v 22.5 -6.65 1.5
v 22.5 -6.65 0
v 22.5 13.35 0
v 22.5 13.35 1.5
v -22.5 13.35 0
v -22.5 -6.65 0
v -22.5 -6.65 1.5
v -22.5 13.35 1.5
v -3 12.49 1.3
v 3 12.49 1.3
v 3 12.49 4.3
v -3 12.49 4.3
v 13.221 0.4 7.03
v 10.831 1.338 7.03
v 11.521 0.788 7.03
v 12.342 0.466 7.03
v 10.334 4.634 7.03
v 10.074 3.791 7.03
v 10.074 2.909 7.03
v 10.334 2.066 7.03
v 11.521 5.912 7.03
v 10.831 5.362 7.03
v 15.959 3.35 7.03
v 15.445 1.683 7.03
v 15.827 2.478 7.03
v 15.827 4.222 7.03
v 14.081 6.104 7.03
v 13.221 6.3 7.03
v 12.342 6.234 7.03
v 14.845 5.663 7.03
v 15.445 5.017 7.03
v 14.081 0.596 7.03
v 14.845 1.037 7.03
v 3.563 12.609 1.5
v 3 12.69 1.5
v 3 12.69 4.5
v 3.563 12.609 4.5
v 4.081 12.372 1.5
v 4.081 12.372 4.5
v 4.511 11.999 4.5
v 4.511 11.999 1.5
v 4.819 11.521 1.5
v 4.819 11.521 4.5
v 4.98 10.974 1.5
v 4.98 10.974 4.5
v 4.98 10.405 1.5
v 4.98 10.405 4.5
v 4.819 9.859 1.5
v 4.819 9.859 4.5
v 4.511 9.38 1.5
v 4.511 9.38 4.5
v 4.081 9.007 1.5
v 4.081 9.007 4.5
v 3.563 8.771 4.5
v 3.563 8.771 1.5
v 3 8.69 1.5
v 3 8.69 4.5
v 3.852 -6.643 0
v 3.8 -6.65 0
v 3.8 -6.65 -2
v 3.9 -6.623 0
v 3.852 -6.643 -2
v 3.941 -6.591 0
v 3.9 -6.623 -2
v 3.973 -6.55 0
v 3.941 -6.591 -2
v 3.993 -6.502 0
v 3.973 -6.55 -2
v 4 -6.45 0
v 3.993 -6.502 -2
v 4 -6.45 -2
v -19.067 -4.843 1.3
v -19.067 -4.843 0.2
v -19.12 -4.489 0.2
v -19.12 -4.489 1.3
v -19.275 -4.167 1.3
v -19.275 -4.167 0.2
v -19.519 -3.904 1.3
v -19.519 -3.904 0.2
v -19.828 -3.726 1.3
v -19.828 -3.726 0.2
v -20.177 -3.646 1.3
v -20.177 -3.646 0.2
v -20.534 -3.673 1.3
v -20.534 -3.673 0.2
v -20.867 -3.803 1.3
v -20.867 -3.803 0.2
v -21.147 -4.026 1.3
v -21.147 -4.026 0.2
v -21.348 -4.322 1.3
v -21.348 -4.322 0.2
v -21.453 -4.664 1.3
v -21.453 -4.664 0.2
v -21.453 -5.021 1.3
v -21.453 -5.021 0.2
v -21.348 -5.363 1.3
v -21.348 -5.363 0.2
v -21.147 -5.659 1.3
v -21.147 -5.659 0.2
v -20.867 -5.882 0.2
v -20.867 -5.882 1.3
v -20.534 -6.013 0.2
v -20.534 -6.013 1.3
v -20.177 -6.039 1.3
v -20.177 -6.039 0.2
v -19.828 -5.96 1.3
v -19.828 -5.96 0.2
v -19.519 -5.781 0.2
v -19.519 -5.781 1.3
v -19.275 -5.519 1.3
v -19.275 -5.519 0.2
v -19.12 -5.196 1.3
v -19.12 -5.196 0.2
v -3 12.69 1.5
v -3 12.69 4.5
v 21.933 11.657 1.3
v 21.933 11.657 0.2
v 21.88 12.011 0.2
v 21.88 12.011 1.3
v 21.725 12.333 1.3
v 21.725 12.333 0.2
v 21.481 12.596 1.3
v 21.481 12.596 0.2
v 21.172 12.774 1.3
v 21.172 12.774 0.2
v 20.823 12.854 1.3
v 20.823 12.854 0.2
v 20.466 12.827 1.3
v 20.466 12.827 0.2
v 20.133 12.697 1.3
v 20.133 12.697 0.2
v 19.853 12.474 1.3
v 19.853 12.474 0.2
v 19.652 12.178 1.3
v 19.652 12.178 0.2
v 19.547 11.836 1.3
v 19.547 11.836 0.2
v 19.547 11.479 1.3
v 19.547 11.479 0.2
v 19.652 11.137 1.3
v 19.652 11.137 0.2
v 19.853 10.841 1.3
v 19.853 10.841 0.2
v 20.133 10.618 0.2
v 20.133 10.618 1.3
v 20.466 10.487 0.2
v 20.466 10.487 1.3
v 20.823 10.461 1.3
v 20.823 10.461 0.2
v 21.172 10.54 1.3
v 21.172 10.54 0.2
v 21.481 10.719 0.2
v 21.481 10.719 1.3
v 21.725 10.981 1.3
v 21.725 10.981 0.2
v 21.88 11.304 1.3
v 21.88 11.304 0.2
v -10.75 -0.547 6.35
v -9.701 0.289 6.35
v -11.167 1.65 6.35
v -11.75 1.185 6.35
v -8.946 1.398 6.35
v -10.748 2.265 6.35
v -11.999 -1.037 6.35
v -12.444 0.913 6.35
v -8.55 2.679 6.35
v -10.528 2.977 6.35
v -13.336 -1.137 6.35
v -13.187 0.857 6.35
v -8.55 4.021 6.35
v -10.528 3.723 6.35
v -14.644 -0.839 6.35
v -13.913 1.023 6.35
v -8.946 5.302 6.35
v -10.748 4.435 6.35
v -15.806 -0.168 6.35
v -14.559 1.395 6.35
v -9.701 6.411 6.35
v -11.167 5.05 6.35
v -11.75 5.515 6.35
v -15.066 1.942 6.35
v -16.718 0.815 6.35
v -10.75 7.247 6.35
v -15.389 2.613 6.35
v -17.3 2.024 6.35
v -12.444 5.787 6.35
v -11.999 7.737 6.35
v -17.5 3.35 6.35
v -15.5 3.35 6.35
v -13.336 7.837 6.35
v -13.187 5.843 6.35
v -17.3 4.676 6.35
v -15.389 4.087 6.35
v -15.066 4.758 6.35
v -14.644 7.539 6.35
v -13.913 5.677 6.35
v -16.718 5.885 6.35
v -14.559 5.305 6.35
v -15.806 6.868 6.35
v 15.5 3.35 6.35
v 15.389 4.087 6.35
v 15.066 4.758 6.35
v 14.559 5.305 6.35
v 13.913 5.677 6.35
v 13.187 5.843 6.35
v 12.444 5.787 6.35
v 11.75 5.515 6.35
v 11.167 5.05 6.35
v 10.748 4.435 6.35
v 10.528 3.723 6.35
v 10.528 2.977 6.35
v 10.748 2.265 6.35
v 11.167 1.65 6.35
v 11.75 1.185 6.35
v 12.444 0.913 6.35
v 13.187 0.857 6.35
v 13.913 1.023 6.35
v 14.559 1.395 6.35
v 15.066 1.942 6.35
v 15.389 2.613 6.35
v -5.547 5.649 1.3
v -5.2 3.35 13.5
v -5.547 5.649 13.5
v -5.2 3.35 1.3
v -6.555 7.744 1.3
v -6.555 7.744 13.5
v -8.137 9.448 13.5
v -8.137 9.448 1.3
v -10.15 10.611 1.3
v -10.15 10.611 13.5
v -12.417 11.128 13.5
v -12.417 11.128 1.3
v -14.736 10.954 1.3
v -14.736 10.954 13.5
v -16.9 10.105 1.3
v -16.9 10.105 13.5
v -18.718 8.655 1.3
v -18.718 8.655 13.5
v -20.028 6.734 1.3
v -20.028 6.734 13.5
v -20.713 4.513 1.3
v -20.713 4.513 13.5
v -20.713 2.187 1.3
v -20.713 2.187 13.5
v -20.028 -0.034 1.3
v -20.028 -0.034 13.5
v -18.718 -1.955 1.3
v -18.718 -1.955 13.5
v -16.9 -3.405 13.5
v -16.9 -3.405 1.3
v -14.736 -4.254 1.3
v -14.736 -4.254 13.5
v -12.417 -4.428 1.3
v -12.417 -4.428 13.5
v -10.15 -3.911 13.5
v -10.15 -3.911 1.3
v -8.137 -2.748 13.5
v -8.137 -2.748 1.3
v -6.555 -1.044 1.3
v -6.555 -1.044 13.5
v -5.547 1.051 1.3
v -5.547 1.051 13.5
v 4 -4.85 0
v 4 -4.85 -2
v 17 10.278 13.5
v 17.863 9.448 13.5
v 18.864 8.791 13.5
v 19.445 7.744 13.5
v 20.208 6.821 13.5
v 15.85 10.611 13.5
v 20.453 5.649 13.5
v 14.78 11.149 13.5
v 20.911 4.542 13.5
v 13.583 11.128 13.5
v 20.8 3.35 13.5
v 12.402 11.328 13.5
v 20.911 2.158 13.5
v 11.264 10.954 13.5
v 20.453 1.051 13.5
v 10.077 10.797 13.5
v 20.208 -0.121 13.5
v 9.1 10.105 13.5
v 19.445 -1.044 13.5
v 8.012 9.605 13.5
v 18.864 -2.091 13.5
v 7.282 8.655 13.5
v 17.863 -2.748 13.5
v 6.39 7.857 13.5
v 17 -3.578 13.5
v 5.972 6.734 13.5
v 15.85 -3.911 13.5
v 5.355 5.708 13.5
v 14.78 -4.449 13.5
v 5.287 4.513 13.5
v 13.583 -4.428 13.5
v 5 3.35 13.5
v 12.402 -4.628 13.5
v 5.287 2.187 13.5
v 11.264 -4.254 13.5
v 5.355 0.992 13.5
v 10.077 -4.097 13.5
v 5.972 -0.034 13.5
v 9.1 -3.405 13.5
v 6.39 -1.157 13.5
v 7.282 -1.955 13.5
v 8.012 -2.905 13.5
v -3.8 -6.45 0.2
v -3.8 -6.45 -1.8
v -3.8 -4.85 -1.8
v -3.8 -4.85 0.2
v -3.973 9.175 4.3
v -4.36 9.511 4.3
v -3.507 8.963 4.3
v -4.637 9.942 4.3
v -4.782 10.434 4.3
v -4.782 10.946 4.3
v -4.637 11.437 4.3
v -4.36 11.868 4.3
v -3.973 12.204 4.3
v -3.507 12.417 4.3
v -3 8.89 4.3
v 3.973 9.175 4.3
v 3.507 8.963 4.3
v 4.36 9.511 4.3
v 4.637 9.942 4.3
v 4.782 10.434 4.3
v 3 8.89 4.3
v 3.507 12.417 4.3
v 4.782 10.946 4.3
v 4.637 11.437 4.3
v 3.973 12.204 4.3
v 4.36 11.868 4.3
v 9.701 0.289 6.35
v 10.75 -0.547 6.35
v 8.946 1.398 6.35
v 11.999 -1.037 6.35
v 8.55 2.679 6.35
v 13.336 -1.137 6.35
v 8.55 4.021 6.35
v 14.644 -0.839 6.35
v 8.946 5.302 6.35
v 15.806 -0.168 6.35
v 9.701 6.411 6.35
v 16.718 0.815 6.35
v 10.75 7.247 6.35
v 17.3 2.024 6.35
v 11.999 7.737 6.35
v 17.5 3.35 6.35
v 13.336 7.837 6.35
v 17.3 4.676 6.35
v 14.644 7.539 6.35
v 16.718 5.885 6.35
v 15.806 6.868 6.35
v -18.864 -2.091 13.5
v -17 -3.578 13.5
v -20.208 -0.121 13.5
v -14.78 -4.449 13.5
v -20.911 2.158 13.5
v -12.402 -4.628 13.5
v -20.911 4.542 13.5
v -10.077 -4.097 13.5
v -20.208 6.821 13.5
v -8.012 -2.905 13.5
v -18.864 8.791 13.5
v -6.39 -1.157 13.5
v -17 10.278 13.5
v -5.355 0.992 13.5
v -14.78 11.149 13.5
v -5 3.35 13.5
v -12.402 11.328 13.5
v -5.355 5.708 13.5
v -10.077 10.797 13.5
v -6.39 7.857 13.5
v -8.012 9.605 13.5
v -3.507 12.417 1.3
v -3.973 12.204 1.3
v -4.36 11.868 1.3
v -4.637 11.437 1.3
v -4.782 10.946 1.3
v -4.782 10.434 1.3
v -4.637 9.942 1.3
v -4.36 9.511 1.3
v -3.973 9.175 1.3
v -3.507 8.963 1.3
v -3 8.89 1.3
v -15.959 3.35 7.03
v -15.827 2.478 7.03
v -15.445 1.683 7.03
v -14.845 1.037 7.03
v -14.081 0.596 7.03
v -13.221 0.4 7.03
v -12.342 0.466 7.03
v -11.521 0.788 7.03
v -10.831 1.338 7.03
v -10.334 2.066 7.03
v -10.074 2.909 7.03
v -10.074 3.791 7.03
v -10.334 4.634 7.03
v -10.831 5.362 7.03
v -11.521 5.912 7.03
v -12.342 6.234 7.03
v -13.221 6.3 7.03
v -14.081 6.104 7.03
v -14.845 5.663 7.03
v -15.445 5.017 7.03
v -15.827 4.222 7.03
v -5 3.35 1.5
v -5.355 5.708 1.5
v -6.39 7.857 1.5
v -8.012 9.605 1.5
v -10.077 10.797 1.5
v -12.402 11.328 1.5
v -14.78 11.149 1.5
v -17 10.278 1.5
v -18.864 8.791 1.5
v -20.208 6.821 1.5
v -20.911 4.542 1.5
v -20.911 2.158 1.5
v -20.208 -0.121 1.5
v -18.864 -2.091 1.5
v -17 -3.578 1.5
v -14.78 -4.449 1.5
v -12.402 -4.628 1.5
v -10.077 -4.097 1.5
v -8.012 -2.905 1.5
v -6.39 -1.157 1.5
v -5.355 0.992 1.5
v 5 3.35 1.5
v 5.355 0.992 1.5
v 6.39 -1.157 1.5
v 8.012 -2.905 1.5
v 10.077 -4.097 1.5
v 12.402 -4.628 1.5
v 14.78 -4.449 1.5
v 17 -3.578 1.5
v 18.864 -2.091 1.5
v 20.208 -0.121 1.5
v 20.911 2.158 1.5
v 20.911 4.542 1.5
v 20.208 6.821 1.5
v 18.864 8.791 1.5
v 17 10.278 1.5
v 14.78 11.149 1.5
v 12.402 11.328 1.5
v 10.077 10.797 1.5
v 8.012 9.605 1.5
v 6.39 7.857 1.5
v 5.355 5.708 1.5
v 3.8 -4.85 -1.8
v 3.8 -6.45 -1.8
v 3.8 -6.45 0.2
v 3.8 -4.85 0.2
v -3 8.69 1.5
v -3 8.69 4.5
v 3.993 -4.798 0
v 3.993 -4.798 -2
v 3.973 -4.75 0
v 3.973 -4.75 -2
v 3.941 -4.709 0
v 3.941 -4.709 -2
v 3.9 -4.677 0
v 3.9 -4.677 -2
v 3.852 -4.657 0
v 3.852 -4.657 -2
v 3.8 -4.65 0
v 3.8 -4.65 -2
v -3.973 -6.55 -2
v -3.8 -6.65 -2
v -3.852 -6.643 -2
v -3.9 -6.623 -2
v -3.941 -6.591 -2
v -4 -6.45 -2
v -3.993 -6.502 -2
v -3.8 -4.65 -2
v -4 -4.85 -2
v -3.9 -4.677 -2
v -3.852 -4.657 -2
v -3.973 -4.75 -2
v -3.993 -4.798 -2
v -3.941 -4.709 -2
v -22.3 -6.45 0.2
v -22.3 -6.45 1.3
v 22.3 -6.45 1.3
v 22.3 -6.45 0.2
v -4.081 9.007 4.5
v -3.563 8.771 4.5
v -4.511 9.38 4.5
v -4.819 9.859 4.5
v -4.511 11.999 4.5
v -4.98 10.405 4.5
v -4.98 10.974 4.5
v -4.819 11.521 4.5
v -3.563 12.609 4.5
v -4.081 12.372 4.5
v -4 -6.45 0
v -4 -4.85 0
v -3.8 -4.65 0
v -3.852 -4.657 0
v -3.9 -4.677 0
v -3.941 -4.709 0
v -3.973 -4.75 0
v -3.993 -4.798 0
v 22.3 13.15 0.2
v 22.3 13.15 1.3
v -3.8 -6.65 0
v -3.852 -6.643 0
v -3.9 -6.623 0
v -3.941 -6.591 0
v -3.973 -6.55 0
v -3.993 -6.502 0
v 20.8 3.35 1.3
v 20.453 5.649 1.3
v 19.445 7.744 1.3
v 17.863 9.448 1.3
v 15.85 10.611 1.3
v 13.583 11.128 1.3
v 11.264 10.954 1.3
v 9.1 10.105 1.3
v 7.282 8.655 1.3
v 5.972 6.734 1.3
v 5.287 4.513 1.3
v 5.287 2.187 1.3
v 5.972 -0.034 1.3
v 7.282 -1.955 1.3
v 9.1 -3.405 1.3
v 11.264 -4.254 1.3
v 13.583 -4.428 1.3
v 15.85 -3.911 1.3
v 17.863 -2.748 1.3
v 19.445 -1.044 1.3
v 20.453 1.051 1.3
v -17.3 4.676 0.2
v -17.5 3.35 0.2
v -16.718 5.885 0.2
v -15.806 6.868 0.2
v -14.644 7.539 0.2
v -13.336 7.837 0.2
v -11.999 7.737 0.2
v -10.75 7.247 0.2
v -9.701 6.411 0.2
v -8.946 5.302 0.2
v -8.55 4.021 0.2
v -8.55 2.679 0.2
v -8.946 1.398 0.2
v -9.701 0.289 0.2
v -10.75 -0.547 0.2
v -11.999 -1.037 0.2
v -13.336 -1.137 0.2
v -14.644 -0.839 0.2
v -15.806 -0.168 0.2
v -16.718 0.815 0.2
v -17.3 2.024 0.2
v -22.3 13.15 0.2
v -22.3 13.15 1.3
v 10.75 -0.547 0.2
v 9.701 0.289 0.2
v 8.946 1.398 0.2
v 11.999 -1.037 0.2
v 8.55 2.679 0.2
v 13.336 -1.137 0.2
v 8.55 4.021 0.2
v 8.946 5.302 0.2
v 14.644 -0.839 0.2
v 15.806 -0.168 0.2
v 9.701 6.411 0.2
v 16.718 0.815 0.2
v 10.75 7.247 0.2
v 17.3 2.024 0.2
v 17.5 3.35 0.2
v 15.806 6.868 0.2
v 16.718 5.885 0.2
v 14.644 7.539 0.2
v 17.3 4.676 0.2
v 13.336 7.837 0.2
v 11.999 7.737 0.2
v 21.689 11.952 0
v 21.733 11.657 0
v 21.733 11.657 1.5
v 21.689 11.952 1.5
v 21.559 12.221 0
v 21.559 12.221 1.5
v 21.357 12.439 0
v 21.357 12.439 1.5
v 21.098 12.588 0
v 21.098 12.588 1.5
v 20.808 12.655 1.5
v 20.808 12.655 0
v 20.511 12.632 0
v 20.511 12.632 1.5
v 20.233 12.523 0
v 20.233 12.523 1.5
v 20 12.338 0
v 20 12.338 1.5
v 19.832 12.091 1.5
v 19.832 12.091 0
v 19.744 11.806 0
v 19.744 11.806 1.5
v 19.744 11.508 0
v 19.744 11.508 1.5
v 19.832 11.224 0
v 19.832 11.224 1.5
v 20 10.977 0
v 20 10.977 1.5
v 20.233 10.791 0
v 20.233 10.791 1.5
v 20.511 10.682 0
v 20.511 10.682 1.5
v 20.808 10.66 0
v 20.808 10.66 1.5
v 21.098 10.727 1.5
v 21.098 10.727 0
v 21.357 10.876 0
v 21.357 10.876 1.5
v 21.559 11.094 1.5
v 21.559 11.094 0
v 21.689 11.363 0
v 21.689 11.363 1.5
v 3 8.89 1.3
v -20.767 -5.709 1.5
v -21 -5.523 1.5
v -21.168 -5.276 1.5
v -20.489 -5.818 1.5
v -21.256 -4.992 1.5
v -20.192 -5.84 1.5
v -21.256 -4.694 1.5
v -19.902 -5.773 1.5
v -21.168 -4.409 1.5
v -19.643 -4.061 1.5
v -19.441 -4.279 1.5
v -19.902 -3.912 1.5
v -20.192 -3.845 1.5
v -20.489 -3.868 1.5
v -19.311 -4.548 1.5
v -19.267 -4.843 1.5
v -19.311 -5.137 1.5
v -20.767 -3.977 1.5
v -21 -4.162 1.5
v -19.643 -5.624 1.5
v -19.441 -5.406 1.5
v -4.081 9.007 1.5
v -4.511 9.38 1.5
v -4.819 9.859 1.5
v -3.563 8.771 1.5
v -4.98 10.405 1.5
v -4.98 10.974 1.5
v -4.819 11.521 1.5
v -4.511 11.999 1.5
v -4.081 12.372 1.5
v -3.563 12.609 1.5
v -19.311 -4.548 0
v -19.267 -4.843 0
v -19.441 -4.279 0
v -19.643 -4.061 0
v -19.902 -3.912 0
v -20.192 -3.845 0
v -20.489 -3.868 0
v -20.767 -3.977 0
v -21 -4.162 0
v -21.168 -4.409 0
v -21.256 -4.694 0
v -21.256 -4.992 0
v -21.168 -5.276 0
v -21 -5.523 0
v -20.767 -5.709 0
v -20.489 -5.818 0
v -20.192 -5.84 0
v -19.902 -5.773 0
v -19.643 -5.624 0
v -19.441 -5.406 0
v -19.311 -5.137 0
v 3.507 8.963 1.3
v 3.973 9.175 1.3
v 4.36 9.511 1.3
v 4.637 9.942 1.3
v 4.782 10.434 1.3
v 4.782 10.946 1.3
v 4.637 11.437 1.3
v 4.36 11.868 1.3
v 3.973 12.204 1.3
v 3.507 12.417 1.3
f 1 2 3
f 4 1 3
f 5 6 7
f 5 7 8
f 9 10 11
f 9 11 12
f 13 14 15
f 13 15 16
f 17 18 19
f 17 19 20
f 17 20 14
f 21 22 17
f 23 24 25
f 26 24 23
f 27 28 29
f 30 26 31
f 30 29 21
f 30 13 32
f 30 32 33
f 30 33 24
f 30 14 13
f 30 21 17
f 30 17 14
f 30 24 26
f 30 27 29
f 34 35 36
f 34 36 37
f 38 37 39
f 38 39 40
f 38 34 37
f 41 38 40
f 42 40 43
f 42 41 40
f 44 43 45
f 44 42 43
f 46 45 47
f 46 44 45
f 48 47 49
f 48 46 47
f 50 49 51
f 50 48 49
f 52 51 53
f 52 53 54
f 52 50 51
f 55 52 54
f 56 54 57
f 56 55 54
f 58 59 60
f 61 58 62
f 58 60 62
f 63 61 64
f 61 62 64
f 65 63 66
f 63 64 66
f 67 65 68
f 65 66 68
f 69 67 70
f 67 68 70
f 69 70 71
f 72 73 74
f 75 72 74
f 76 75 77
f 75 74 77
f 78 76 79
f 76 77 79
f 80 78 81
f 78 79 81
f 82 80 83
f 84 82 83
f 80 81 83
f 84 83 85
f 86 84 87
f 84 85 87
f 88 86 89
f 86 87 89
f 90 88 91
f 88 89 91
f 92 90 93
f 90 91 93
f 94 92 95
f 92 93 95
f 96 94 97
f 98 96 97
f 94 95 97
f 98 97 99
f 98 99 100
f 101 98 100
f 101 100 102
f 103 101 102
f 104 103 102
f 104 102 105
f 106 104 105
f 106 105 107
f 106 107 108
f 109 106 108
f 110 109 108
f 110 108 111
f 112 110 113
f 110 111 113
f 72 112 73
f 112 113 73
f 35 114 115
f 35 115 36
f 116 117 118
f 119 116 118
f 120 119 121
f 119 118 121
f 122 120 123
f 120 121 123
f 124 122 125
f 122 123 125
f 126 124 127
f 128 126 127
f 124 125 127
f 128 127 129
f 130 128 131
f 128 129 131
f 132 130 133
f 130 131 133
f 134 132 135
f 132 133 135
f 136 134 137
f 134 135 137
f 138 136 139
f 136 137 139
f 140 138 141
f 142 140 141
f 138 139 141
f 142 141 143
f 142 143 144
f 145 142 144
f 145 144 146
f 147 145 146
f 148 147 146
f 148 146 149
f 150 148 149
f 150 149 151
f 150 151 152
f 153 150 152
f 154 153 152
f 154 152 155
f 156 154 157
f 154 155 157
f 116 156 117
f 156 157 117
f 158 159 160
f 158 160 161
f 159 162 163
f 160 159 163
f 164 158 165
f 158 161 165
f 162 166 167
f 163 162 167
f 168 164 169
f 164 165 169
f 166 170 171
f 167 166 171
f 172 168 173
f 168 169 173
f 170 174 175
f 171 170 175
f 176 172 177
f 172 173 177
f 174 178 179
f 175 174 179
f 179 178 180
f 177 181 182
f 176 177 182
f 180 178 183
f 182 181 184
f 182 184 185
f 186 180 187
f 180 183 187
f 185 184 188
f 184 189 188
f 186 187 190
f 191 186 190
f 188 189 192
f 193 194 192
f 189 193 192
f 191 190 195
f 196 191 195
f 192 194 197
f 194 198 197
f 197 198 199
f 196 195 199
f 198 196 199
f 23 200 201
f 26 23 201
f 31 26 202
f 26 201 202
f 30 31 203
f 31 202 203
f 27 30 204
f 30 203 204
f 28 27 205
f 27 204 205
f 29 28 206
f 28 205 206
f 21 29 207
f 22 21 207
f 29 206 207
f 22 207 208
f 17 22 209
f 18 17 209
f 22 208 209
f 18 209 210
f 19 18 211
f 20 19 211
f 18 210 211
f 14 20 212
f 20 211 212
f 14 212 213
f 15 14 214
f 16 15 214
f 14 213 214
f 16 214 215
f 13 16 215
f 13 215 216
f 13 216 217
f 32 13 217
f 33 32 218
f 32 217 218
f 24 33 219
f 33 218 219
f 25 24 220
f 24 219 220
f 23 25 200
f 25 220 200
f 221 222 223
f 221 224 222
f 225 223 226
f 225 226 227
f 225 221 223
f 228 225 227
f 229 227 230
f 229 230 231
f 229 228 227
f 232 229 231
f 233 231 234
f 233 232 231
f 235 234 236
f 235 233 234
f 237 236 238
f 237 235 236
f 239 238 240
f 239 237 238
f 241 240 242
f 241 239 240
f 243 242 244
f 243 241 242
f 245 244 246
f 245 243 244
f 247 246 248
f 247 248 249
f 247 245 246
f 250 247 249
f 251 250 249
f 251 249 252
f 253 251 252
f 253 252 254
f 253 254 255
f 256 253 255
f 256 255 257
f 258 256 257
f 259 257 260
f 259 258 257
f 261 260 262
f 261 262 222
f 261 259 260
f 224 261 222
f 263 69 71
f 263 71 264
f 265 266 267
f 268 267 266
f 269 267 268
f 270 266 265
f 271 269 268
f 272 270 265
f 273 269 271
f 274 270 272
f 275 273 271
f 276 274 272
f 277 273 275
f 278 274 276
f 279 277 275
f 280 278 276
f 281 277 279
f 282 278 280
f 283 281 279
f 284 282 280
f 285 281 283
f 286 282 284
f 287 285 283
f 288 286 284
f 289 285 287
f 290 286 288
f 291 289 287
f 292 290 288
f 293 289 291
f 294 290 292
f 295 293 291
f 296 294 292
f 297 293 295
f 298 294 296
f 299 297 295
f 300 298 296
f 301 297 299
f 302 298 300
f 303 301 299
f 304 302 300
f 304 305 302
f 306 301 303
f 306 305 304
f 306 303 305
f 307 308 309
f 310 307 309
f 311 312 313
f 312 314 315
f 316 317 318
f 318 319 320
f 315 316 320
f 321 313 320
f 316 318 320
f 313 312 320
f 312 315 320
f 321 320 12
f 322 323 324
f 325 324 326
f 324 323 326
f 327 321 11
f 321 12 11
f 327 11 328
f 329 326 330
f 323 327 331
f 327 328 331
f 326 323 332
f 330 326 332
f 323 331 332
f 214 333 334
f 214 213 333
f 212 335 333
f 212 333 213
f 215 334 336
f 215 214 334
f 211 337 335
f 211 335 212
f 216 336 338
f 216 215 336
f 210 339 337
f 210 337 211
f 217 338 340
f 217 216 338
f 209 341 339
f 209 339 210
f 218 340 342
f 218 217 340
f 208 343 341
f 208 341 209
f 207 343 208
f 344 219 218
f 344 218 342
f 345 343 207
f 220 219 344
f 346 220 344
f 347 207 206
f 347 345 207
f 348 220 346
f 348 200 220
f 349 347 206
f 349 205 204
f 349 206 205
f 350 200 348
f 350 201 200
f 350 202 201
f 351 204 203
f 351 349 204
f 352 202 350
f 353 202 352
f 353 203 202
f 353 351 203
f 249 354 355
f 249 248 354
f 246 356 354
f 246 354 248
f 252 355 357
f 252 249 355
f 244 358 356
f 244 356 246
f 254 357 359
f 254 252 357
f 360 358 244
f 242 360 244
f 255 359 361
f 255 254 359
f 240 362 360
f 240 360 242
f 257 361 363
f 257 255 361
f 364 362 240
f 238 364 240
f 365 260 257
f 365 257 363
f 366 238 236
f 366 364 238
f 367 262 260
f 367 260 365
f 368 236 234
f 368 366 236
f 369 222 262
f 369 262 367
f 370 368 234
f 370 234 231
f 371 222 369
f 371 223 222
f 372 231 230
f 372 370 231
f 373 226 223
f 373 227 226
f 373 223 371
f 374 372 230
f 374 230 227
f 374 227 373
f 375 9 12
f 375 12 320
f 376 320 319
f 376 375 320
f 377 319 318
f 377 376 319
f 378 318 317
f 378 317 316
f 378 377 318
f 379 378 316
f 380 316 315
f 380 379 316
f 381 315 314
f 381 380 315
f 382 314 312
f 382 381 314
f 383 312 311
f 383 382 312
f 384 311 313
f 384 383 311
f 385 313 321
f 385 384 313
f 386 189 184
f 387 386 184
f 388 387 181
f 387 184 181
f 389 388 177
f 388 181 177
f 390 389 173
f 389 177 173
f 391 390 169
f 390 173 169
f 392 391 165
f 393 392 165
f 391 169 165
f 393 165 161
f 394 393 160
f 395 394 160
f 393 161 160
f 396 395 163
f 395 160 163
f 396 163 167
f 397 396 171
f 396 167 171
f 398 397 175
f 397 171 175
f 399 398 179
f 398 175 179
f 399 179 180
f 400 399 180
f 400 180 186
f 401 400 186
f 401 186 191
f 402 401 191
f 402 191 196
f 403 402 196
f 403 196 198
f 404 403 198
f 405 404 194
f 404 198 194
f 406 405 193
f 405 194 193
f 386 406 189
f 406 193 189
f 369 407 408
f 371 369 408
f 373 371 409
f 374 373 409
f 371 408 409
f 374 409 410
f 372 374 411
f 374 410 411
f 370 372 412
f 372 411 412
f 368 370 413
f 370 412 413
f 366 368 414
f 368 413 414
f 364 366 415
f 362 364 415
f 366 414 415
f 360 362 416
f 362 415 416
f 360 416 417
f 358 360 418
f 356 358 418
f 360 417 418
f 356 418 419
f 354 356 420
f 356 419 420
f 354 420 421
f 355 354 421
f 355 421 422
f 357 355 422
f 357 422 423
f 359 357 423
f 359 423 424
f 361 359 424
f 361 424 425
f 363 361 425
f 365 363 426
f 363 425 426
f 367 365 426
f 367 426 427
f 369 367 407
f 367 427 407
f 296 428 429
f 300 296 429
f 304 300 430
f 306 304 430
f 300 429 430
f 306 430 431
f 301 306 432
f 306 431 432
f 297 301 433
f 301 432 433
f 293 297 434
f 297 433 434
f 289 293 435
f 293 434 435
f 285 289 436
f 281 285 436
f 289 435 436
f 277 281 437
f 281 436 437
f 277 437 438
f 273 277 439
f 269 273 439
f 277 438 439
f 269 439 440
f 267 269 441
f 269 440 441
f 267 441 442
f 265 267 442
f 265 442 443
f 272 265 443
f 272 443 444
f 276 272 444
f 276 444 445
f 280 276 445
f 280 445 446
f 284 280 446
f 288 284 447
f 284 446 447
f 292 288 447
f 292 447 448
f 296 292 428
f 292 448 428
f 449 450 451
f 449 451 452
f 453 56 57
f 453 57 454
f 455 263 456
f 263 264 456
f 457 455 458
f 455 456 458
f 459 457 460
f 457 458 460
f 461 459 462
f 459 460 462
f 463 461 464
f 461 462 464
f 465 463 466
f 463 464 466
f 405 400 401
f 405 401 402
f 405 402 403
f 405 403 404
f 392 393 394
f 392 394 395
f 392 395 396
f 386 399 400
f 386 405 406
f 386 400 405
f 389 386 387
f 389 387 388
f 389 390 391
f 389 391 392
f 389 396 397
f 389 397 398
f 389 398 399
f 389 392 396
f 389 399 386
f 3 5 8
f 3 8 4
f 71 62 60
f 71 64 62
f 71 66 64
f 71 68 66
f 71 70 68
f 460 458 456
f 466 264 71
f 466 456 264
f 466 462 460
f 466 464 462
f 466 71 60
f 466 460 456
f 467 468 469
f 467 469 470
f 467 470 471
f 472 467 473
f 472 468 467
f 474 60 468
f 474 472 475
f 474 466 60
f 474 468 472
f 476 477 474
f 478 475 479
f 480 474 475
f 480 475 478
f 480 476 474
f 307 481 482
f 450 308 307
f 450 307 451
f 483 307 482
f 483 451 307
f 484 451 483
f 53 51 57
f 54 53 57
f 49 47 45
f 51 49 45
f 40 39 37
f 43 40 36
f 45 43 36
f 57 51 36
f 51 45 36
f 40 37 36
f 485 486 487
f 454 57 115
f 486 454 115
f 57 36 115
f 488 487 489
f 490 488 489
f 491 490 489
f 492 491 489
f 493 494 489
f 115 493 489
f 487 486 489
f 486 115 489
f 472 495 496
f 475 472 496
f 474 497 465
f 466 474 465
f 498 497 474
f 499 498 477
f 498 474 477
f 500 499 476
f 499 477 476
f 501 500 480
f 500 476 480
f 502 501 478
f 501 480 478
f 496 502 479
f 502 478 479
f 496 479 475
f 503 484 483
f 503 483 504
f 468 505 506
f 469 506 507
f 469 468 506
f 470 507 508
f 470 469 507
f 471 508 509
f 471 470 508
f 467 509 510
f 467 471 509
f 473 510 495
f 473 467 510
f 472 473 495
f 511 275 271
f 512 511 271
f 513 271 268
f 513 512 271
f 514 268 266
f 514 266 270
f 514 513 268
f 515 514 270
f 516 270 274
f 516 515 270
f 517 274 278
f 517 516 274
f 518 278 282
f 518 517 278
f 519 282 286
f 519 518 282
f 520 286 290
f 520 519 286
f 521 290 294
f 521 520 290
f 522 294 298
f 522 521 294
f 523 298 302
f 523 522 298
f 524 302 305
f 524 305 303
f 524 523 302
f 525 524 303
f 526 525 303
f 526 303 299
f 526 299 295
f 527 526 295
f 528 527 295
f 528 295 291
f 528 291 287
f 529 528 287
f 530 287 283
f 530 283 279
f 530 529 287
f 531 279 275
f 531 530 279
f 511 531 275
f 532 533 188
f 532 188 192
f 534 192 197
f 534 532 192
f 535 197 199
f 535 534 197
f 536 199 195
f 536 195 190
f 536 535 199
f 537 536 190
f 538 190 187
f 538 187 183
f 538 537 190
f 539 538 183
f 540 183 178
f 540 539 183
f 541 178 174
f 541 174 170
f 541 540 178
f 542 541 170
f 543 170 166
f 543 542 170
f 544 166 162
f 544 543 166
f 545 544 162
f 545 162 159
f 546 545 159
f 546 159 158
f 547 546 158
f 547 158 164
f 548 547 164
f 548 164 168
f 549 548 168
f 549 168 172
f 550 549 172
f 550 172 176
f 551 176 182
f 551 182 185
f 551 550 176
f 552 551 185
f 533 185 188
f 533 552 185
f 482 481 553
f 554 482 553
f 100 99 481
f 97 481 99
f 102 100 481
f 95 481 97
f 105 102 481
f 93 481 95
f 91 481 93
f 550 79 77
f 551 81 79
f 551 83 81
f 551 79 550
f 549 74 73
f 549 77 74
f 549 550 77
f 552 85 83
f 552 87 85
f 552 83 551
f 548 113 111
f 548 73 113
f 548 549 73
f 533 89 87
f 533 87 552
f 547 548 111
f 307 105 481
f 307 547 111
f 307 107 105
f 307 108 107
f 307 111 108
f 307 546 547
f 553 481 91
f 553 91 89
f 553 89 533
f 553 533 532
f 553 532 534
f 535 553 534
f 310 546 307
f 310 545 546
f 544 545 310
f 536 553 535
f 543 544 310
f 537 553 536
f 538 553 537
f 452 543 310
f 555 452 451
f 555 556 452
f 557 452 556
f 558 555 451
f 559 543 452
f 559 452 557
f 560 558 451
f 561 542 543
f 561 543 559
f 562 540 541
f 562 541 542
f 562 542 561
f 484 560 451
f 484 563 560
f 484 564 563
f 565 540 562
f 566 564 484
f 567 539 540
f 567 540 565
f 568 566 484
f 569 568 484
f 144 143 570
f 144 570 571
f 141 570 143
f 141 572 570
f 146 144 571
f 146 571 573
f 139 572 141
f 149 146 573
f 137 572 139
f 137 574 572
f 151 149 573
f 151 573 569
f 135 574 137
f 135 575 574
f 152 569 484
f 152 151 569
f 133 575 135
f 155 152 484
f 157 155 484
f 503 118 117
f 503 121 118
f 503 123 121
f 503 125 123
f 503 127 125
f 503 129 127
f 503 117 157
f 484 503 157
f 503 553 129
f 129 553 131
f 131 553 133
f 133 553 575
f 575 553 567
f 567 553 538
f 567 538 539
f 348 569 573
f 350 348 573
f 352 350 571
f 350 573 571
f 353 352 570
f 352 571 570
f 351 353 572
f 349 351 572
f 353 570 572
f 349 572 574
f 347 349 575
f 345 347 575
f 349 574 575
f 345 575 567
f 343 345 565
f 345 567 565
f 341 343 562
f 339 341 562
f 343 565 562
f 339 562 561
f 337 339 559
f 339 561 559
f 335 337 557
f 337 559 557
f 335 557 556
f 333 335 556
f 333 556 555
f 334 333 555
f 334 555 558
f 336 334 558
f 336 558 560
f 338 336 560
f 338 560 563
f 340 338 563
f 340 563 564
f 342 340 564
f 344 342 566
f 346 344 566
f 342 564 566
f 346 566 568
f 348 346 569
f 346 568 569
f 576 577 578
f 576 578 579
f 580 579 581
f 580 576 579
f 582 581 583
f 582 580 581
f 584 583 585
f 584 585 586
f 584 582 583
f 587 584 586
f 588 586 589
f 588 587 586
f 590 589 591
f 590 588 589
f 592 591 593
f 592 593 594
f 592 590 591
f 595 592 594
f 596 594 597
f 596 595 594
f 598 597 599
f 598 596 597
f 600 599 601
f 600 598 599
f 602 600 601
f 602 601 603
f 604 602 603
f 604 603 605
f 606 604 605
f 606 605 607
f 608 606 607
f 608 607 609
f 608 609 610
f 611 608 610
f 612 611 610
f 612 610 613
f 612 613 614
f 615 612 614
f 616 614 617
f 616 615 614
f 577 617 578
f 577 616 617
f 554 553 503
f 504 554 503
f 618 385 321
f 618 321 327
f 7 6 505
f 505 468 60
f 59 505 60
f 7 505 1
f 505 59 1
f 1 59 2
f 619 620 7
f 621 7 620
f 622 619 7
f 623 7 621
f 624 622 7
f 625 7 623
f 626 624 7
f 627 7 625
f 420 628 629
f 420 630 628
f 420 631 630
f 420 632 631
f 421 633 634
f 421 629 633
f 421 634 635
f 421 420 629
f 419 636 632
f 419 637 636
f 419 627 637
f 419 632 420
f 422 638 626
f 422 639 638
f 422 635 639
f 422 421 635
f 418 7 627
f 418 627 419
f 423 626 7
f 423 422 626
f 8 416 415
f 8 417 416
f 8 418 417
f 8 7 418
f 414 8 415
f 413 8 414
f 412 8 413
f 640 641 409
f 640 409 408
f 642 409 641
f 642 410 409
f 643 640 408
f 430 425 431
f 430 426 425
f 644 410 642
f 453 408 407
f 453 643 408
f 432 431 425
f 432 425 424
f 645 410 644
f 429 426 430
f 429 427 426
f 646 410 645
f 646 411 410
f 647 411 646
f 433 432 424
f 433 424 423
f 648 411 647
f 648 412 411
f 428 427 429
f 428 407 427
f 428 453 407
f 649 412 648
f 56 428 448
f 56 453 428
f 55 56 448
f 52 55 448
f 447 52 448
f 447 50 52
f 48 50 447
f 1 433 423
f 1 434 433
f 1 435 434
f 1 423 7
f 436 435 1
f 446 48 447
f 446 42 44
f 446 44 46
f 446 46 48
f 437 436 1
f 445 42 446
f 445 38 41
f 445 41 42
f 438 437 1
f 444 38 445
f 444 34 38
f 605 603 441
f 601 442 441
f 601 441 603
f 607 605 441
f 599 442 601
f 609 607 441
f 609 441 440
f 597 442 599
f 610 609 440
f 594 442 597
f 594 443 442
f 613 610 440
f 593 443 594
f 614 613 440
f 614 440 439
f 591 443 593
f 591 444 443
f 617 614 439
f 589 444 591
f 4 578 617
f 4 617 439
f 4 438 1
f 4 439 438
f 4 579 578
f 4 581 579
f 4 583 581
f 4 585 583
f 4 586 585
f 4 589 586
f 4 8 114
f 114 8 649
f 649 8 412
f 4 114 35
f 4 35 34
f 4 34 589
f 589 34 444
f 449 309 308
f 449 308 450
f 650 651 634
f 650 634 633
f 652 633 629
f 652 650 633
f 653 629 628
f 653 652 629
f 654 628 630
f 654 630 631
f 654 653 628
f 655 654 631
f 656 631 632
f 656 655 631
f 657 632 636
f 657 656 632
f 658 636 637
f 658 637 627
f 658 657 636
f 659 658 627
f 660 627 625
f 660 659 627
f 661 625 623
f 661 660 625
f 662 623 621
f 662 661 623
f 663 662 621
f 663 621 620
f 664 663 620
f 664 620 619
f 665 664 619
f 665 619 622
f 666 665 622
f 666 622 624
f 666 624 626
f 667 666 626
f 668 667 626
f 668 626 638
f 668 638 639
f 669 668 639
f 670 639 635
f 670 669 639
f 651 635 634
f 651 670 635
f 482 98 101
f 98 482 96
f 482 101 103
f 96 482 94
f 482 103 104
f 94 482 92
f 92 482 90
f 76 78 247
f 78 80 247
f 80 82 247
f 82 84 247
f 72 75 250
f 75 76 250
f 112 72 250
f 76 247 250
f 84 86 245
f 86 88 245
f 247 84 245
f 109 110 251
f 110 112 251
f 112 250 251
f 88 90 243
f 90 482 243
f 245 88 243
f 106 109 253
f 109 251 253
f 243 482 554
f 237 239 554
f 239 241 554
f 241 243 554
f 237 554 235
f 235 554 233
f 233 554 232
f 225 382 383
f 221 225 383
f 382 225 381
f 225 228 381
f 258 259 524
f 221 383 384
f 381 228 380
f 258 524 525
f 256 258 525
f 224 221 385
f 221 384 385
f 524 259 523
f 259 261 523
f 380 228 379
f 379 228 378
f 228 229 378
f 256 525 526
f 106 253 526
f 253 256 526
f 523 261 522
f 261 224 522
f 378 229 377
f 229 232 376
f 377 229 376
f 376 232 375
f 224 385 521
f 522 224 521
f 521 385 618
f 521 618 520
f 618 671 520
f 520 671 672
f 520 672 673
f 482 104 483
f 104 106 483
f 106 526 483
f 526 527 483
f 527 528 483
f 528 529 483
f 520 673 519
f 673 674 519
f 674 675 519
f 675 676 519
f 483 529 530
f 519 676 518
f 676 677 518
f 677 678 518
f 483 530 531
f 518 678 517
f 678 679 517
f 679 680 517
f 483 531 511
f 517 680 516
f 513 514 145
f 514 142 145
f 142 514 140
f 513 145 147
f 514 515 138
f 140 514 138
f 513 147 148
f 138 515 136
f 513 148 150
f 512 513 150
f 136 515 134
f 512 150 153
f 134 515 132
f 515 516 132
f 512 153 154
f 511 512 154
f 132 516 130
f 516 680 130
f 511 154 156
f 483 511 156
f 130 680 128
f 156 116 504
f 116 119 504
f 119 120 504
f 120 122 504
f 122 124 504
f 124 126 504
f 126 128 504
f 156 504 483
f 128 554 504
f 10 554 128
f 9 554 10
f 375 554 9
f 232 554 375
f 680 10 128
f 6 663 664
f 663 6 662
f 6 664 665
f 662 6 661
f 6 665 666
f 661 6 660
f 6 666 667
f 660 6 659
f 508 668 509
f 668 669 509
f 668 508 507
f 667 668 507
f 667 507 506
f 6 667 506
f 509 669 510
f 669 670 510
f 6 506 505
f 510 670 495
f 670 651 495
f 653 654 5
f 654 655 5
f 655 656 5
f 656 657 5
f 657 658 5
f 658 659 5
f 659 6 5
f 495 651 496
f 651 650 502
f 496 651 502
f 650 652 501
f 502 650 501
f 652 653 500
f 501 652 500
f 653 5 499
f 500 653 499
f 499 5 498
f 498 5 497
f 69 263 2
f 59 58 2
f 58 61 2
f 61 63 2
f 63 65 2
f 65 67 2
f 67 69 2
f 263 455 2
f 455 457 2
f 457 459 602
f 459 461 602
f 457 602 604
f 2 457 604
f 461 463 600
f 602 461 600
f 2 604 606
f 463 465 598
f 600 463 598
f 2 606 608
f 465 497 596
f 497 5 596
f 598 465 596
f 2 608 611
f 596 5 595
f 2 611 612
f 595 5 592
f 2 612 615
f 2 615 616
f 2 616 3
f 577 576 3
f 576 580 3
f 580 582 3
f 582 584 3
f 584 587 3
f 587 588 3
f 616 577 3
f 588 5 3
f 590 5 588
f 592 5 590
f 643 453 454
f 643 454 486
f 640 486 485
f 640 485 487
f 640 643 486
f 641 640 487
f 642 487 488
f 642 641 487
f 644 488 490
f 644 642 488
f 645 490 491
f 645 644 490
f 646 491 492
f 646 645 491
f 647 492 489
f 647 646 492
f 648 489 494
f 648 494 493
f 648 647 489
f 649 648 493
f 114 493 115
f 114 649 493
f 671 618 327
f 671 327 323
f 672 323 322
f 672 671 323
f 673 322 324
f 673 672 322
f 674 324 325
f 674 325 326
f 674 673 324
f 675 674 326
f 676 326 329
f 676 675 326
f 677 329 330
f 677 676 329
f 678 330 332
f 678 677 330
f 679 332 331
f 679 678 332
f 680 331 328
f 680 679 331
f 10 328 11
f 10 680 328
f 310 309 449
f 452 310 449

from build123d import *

# Parameters (mm, degrees)
CROQUIS1_W                = 45
CROQUIS1_H                = 20
CROQUIS1_R                = 1
SALIENTE_EXTRUIR1_DEPTH   = 1.5
CROQUIS2_R                = 8
SALIENTE_EXTRUIR2_DEPTH   = 12
CROQUIS4_W                = 2
CROQUIS4_H                = 2
SALIENTE_EXTRUIR4_DEPTH   = 2
REDONDEO3_R               = 0.2
SALIENTE_EXTRUIR6_DEPTH   = 3
VACIADO1_START            = 0.2
VACIADO1_OUTLINE_R        = 7.8
VACIADO1_DEPTH            = 13.1
VACIADO1_2_OUTLINE_W      = 44.6
VACIADO1_2_OUTLINE_H      = 19.6
VACIADO1_2_OUTLINE_R      = 1.2
VACIADO1_2_OUTLINE_R_2    = 7.8
VACIADO1_2_DEPTH          = 1.1
VACIADO1_START_2          = 1.3
VACIADO1_3_DEPTH          = 3
VACIADO1_START_3          = 13.3
VACIADO1_4_OUTLINE_R      = 7.8
VACIADO1_4_DEPTH          = 0.2
VACIADO1_START_4          = -1.8
VACIADO1_5_OUTLINE_W      = 7.6
VACIADO1_5_OUTLINE_H      = 1.6
VACIADO1_5_DEPTH          = 2
CROQUIS9_R                = 4.5
SALIENTE_EXTRUIR8_DEPTH   = 6.15
CROQUIS10_R               = 2.5
SALIENTE_EXTRUIR9_DEPTH   = 0.68
SALIENTE_EXTRUIR9_DRAFT   = -34
CORTAR_EXTRUIR1_START     = -12
CROQUIS12_R               = 7.8
CORTAR_EXTRUIR1_DEPTH     = 12
SIMETR_A3_COPY_1_SKETCH_R = 2.5
SIMETR_A3_COPY_1_DEPTH    = 0.68
SIMETR_A3_COPY_1_DRAFT    = -34


# Read off the part's stored shape, not the designer's step: Vaciado1
with BuildPart() as part:
    # Croquis1 → Saliente-Extruir1 (new body)
    with BuildSketch(Plane.XY):
        with Locations((0, 3.35)):
            Rectangle(CROQUIS1_W, CROQUIS1_H)
        with Locations((20.733115081, 11.657404702)):
            Circle(CROQUIS1_R, mode=Mode.SUBTRACT)
        with Locations((-20.266884919, -4.842595298)):
            Circle(CROQUIS1_R, mode=Mode.SUBTRACT)
    extrude(amount=SALIENTE_EXTRUIR1_DEPTH)

    # Croquis2 → Saliente-Extruir2 (add)
    with BuildSketch(Plane.XY.offset(1.5)):
        with Locations((-13, 3.35)):
            Circle(CROQUIS2_R)
        with Locations(Location((13, 3.35, 0), (0, 0, 180))):
            Circle(CROQUIS2_R)
    extrude(amount=SALIENTE_EXTRUIR2_DEPTH)

    # Croquis4 → Saliente-Extruir4 (add)
    with BuildSketch(Plane(origin=(0, 0, 0), x_dir=(-1, 0, 0), z_dir=(0, 0, -1))):
        with Locations((-3, -5.65)):
            Rectangle(CROQUIS4_W, CROQUIS4_H)
        with Locations((3, -5.65)):
            Rectangle(CROQUIS4_W, CROQUIS4_H)
        with Locations((1, -5.65)):
            Rectangle(CROQUIS4_W, CROQUIS4_H)
        with Locations((-1, -5.65)):
            Rectangle(CROQUIS4_W, CROQUIS4_H)
    extrude(amount=SALIENTE_EXTRUIR4_DEPTH)

    # Redondeo3
    redondeo3_edges = [part.edges().sort_by_distance(p)[0] for p in [
        (-4, -4.65, -1),
        (4, -4.65, -1),
        (4, -6.65, -1),
        (-4, -6.65, -1),
    ]]
    fillet(redondeo3_edges, radius=REDONDEO3_R)

    # Croquis6 → Saliente-Extruir6 (add)
    with BuildSketch(Plane.XY.offset(1.5)):
        with BuildLine():
            Line((-3, 12.689741285), (3, 12.689741285))
            ThreePointArc((3, 12.689741285), (5, 10.689741285), (3, 8.689741285))
            Line((3, 8.689741285), (-3, 8.689741285))
            ThreePointArc((-3, 8.689741285), (-5, 10.689741285), (-3, 12.689741285))
        make_face()
    extrude(amount=SALIENTE_EXTRUIR6_DEPTH)

    # Vaciado1 outline → Vaciado1 (cut)
    with BuildSketch(Plane.XY.offset(VACIADO1_START)):
        with Locations((-13, 3.35)):
            Circle(VACIADO1_OUTLINE_R)
        with Locations((13, 3.35)):
            Circle(VACIADO1_OUTLINE_R)
    extrude(amount=VACIADO1_DEPTH, mode=Mode.SUBTRACT)

    # Vaciado1 2 outline → Vaciado1 2 (cut)
    with BuildSketch(Plane.XY.offset(VACIADO1_START)):
        with Locations((0, 3.35)):
            Rectangle(VACIADO1_2_OUTLINE_W, VACIADO1_2_OUTLINE_H)
        with Locations((-20.266884919, -4.842595298)):
            Circle(VACIADO1_2_OUTLINE_R, mode=Mode.SUBTRACT)
        with Locations((-13, 3.35)):
            Circle(VACIADO1_2_OUTLINE_R_2, mode=Mode.SUBTRACT)
        with Locations((13, 3.35)):
            Circle(VACIADO1_2_OUTLINE_R_2, mode=Mode.SUBTRACT)
        with Locations((20.733115081, 11.657404702)):
            Circle(VACIADO1_2_OUTLINE_R, mode=Mode.SUBTRACT)
    extrude(amount=VACIADO1_2_DEPTH, mode=Mode.SUBTRACT)

    # Vaciado1 3 outline → Vaciado1 3 (cut)
    with BuildSketch(Plane.XY.offset(VACIADO1_START_2)):
        with BuildLine():
            ThreePointArc((-3, 12.489741285), (-4.8, 10.689741285), (-3, 8.889741285))
            Line((-3, 8.889741285), (3, 8.889741285))
            ThreePointArc((3, 8.889741285), (4.8, 10.689741285), (3, 12.489741285))
            Line((3, 12.489741285), (-3, 12.489741285))
        make_face()
    extrude(amount=VACIADO1_3_DEPTH, mode=Mode.SUBTRACT)

    # Vaciado1 4 outline → Vaciado1 4 (cut)
    with BuildSketch(Plane.XY.offset(VACIADO1_START_3)):
        with Locations((13, 3.35)):
            Circle(VACIADO1_4_OUTLINE_R)
    extrude(amount=VACIADO1_4_DEPTH, mode=Mode.SUBTRACT)

    # Vaciado1 5 outline → Vaciado1 5 (cut)
    with BuildSketch(Plane.XY.offset(VACIADO1_START_4)):
        with Locations((0, -5.65)):
            Rectangle(VACIADO1_5_OUTLINE_W, VACIADO1_5_OUTLINE_H)
    extrude(amount=VACIADO1_5_DEPTH, mode=Mode.SUBTRACT)

    # Croquis9 → Saliente-Extruir8 (add)
    with BuildSketch(Plane.XY.offset(0.2)):
        with Locations((13, 3.35)):
            Circle(CROQUIS9_R)
    saliente_extruir8 = extrude(amount=SALIENTE_EXTRUIR8_DEPTH)


with BuildPart() as saliente_extruir9_tool:
    # Croquis10 → Saliente-Extruir9 (with draft: the straight prism first)
    with BuildSketch(Plane.XY.offset(6.35)):
        with Locations((13, 3.35)):
            Circle(CROQUIS10_R)
    extrude(amount=SALIENTE_EXTRUIR9_DEPTH)
    # Saliente-Extruir9: the draft: its side faces are tilted about the plane it starts from
    saliente_extruir9_sides = [saliente_extruir9_tool.faces().sort_by_distance(p)[0] for p in [
        (10.5, 3.35, 6.69),
    ]]
    draft(saliente_extruir9_sides, Plane.XY.offset(6.35), SALIENTE_EXTRUIR9_DRAFT)


with BuildPart() as part_1:
    add(part.part)

    # Saliente-Extruir9: add saliente_extruir9_tool
    add(saliente_extruir9_tool.part)

    # Croquis12 → Cortar-Extruir1 (cut)
    with BuildSketch(Plane.XY.offset(13.5).offset(CORTAR_EXTRUIR1_START)):
        with Locations((-13, 3.35)):
            Circle(CROQUIS12_R)
    extrude(amount=CORTAR_EXTRUIR1_DEPTH, mode=Mode.SUBTRACT)

    # Simetría3: Saliente-Extruir8 across plane
    add(saliente_extruir8.mirror(Plane(origin=(0, 0, 0), x_dir=(0, 0, 1), z_dir=(1, 0, 0))))


with BuildPart() as simetr_a3_copy_1_tool:
    # Simetría3 copy 1 sketch → Simetría3 copy 1 (with draft: the straight prism first)
    with BuildSketch(Plane(origin=(0, 0, 6.35), x_dir=(-1, 0, 0), z_dir=(0, 0, 1))):
        with Locations((13, -3.35)):
            Circle(SIMETR_A3_COPY_1_SKETCH_R)
    extrude(amount=SIMETR_A3_COPY_1_DEPTH)
    # Simetría3 copy 1: the draft: its side faces are tilted about the plane it starts from
    simetr_a3_copy_1_sides = [simetr_a3_copy_1_tool.faces().sort_by_distance(p)[0] for p in [
        (-10.5, 3.35, 6.69),
    ]]
    draft(simetr_a3_copy_1_sides, Plane(origin=(0, 0, 6.35), x_dir=(-1, 0, 0), z_dir=(0, 0, 1)), SIMETR_A3_COPY_1_DRAFT)


with BuildPart() as part_2:
    add(part_1.part)

    # Simetría3 copy 1: add simetr_a3_copy_1_tool
    add(simetr_a3_copy_1_tool.part)


solid = part_2.part
